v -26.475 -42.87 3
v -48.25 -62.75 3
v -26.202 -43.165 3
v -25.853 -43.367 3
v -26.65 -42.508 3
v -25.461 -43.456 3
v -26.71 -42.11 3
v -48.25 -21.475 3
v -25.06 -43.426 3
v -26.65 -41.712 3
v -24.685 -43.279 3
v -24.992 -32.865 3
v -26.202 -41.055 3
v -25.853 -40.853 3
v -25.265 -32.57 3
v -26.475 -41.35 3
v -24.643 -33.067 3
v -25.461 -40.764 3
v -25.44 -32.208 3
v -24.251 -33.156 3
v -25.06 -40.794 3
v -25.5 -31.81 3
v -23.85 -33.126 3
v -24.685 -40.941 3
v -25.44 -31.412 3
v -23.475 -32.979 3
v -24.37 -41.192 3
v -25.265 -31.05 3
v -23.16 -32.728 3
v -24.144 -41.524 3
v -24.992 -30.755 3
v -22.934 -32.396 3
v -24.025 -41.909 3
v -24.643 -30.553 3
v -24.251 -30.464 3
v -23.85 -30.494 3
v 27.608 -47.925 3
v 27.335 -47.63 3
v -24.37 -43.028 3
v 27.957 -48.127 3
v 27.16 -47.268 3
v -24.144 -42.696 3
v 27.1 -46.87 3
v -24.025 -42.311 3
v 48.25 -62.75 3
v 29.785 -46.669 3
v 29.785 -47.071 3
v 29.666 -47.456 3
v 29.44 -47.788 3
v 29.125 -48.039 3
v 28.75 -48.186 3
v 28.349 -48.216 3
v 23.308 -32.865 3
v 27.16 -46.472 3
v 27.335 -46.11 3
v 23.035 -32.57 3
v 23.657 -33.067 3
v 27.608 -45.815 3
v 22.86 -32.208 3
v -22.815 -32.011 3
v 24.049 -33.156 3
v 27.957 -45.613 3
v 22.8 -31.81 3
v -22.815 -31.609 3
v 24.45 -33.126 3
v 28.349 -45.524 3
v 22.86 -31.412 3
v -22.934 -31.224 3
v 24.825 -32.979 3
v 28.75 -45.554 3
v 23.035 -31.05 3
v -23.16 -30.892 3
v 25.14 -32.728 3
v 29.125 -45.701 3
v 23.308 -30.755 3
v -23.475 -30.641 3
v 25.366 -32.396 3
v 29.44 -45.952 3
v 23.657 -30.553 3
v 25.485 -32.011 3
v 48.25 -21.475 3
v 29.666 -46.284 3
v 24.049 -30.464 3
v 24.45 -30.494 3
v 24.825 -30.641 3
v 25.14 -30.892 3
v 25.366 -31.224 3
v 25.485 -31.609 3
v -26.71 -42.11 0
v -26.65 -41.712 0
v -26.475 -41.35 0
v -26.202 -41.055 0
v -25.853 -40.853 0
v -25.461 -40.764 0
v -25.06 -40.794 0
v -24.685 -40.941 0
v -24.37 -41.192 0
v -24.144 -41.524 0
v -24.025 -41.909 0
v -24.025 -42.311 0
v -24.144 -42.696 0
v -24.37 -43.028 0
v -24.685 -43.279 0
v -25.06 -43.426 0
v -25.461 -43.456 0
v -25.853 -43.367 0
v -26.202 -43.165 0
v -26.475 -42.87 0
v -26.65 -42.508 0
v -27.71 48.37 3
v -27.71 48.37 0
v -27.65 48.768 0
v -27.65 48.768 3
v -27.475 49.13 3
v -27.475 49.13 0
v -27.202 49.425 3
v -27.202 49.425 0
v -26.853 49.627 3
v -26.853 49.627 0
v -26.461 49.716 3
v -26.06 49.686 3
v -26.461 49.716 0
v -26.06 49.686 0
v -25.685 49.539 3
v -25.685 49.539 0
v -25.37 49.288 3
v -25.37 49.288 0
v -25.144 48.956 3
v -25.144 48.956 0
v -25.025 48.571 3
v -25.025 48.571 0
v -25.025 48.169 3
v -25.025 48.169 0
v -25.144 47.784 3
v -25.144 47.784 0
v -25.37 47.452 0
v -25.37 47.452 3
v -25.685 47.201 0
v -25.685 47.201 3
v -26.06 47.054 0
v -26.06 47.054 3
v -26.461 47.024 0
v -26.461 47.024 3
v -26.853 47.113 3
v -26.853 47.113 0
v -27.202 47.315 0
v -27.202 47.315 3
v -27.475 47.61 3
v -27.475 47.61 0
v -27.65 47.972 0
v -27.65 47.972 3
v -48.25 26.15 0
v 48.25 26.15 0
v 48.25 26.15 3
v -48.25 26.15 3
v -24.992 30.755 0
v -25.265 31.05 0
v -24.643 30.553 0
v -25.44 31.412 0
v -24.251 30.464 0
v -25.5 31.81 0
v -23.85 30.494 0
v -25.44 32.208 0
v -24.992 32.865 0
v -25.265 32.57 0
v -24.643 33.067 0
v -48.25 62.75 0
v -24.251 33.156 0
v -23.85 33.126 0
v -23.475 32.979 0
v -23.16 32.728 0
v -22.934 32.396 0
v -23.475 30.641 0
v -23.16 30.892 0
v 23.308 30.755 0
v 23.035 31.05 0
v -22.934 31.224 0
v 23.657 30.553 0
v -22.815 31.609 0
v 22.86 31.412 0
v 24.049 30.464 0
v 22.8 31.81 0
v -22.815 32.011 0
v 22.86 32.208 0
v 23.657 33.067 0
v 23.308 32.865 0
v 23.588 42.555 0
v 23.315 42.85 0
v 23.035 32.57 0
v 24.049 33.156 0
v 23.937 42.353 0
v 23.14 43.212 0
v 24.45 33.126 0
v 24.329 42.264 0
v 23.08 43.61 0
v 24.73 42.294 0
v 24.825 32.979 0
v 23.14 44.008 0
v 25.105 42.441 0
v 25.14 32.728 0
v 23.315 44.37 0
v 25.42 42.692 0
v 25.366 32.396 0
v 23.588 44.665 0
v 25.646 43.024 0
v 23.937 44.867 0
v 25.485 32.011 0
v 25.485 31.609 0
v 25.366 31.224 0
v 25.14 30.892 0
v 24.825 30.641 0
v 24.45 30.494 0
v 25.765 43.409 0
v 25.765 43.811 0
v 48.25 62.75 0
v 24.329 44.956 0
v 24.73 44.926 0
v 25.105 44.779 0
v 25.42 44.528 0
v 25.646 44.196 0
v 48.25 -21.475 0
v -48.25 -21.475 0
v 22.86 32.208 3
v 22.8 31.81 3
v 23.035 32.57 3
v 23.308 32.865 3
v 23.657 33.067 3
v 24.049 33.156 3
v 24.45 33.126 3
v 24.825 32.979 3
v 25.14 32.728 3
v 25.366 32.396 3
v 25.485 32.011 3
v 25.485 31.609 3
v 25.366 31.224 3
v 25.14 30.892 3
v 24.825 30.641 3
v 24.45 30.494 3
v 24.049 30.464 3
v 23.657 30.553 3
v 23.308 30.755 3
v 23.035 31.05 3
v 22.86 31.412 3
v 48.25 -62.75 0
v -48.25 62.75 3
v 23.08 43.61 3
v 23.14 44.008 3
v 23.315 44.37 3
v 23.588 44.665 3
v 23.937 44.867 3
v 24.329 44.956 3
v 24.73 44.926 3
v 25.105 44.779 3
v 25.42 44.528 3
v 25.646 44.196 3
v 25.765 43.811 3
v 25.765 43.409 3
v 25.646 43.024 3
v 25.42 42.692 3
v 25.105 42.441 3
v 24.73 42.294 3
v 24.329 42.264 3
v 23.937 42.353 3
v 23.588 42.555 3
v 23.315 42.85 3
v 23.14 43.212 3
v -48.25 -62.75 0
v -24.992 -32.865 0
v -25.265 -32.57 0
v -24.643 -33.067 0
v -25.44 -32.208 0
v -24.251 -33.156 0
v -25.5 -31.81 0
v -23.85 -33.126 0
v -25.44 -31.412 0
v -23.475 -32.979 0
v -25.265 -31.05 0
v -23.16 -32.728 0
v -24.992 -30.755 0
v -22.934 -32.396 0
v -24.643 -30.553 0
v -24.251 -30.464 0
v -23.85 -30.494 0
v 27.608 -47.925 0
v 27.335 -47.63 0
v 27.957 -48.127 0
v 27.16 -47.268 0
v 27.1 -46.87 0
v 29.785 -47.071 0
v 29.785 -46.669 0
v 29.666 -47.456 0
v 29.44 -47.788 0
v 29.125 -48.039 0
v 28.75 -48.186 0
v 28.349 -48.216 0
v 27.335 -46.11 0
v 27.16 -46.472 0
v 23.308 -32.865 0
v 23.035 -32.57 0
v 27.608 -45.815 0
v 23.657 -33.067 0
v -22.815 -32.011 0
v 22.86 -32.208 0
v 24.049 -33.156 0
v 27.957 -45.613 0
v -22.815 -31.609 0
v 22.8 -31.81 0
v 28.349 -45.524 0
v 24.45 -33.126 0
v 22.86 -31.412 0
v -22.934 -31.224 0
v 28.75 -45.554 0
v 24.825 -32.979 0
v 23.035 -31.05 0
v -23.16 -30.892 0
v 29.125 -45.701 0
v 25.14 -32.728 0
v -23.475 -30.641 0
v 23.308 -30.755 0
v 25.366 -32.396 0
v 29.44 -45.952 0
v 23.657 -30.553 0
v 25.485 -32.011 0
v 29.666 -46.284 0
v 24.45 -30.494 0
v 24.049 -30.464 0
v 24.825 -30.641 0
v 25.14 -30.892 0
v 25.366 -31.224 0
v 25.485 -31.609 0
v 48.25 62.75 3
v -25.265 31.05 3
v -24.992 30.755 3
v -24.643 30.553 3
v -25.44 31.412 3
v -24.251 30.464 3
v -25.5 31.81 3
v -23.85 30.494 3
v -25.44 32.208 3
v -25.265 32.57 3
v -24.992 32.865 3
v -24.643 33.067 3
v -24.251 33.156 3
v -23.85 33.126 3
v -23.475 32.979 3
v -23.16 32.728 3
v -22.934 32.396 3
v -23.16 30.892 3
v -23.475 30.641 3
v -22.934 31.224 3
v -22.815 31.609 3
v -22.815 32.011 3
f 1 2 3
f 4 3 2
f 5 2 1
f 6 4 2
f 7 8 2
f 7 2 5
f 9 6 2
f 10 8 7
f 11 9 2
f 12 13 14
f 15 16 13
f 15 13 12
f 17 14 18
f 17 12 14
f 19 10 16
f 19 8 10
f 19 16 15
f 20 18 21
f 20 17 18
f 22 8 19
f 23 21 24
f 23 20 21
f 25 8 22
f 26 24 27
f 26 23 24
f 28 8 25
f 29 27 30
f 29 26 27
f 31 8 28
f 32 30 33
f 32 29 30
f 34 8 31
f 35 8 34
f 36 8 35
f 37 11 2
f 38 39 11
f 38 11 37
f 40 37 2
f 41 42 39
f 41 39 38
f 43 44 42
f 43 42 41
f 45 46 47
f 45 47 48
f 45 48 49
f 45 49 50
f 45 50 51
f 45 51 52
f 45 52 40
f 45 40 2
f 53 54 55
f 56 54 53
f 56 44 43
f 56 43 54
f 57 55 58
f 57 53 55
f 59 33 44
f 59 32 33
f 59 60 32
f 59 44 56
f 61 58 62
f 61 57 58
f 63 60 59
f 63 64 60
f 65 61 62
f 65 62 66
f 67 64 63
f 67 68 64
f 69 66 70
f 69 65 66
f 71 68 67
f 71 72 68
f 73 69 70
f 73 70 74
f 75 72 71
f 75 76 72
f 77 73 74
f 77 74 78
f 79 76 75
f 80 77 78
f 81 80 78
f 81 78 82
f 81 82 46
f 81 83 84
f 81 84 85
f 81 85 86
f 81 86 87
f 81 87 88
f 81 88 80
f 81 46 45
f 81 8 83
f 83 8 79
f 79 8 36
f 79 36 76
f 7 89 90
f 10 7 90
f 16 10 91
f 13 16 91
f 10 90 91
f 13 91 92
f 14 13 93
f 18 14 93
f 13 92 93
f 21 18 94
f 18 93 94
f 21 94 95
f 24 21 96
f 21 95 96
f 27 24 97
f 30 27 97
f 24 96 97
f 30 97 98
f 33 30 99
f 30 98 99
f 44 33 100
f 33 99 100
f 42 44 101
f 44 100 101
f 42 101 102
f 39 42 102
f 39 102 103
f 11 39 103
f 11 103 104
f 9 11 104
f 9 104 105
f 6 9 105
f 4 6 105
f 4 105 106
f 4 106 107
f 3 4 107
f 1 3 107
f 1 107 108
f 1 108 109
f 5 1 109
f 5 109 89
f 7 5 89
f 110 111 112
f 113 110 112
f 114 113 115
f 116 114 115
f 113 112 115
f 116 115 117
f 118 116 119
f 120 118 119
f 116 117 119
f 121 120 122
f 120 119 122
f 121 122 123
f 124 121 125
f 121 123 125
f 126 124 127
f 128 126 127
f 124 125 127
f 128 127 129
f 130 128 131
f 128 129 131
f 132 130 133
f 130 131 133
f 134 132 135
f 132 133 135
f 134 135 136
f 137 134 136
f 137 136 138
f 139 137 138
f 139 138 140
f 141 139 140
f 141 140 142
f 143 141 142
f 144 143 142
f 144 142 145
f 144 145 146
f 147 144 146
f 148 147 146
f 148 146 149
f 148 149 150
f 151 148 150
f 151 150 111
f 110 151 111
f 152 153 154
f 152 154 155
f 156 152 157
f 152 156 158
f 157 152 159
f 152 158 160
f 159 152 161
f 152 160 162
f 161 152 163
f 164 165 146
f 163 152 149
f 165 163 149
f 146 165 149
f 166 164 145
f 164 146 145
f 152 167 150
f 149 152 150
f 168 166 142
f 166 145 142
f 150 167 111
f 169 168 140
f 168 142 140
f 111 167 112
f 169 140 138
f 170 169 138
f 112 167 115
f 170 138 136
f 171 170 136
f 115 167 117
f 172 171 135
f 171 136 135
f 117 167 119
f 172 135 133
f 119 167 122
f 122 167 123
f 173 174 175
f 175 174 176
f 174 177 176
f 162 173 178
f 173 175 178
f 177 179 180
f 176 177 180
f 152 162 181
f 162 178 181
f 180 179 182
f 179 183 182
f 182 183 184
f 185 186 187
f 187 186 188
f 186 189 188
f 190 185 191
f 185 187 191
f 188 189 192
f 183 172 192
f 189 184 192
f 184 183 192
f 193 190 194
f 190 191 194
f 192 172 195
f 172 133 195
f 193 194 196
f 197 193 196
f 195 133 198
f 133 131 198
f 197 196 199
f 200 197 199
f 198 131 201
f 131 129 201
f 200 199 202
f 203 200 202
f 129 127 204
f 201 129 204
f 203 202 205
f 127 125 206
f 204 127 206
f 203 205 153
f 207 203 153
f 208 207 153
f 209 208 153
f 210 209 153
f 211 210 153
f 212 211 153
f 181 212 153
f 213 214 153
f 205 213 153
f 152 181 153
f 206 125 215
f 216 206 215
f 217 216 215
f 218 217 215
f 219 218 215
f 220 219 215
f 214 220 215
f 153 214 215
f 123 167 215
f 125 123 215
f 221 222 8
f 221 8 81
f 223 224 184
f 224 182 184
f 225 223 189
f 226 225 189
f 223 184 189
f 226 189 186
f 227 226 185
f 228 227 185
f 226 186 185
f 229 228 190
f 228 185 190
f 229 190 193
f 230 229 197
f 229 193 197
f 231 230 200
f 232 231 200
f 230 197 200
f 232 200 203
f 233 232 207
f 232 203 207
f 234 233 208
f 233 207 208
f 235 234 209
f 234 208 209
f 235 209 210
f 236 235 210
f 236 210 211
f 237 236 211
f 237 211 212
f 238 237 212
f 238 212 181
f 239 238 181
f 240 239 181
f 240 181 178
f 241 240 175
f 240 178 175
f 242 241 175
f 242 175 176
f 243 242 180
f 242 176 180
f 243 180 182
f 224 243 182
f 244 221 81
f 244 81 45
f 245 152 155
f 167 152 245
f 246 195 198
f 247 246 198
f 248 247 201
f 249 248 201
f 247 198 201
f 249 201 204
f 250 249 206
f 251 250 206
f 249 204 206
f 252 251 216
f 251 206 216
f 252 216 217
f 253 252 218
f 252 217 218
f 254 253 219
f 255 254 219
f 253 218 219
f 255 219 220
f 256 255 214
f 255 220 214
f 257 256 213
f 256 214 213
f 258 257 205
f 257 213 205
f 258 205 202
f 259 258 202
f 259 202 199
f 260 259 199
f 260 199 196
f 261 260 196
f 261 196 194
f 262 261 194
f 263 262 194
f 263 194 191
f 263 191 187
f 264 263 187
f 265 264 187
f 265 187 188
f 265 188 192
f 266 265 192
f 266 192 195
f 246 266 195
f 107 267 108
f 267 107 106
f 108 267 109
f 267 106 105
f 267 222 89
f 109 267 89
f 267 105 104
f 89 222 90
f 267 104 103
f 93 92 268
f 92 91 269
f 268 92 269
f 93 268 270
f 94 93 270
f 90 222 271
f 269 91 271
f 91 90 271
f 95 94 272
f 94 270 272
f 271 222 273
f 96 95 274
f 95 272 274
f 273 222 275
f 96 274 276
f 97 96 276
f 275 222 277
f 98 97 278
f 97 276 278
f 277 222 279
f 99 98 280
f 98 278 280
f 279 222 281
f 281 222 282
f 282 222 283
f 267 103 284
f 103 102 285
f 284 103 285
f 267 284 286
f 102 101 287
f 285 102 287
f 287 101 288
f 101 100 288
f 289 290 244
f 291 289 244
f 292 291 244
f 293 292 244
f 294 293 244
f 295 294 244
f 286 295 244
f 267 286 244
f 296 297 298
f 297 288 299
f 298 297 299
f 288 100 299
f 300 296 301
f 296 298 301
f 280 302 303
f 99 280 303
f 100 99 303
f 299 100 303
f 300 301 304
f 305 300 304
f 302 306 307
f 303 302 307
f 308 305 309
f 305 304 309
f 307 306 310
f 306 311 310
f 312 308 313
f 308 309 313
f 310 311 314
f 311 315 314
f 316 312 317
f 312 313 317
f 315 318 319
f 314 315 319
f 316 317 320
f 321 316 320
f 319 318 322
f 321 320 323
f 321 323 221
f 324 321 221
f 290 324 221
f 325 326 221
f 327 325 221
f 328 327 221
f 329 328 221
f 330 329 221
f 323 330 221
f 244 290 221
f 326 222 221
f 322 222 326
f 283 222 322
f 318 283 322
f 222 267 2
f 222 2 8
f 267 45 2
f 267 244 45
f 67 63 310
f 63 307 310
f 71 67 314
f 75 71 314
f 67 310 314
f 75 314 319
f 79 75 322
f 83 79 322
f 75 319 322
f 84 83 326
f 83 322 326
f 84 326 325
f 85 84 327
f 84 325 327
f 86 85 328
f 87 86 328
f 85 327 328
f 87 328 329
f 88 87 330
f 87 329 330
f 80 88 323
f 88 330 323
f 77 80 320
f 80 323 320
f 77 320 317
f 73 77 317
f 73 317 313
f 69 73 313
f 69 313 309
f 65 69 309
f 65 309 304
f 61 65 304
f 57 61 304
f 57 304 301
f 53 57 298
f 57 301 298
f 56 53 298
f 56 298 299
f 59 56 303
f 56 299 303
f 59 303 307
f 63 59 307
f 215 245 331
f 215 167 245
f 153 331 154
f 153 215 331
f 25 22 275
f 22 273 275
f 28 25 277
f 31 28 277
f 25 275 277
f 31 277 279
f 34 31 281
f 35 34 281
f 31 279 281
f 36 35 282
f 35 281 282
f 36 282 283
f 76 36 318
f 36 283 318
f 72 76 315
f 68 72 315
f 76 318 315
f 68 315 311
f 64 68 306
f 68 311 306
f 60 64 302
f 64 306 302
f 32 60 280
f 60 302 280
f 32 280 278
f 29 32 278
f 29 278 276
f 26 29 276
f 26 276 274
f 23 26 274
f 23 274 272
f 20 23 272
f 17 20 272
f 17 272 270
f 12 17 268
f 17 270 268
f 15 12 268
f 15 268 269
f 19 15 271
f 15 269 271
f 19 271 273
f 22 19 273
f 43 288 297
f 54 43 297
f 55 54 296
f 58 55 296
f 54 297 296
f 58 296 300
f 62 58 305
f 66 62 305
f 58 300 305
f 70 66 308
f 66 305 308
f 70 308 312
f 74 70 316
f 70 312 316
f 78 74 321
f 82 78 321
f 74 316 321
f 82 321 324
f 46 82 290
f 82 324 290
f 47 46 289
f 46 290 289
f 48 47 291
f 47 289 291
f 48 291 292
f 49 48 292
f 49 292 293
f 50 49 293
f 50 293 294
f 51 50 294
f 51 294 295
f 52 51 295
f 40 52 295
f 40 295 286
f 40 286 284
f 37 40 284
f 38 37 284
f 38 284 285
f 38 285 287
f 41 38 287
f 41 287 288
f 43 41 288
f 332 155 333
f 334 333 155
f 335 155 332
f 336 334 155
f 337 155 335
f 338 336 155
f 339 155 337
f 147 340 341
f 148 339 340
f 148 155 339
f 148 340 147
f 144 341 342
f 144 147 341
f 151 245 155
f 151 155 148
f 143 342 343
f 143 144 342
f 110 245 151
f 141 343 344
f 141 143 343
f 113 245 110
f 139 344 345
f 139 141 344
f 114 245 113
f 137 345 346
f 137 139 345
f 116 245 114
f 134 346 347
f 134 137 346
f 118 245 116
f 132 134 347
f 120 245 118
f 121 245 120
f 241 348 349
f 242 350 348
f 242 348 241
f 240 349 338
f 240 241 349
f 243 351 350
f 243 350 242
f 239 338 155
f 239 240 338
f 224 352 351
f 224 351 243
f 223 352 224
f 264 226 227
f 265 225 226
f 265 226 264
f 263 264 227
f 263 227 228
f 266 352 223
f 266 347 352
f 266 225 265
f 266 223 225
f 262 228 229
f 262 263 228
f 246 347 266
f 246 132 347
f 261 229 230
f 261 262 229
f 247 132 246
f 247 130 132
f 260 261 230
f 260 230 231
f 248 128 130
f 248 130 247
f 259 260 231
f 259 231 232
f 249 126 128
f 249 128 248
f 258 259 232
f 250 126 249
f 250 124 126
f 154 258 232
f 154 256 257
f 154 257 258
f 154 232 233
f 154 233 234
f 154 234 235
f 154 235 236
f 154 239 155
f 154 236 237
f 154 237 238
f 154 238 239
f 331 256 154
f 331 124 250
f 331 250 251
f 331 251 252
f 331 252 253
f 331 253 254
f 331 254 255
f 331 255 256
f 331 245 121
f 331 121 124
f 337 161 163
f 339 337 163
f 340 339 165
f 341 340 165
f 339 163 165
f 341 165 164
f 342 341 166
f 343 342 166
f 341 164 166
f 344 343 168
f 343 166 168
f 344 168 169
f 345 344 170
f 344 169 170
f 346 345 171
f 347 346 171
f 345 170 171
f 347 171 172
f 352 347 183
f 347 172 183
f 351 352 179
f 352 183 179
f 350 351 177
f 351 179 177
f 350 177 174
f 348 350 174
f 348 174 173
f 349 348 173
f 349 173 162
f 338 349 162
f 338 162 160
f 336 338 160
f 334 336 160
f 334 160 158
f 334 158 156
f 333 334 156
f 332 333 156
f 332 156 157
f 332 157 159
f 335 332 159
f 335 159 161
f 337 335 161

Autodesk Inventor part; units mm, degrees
ref_plane "YZ Plane" through (0, 0, 0) normal (1, 0, 0) x (0, 1, 0)
ref_plane "XZ Plane" through (0, 0, 0) normal (0, 1, 0) x (-1, 0, 0)
ref_plane "XY Plane" through (0, 0, 0) normal (0, 0, 1) x (1, 0, 0)
sketch "Sketch1" plane through (0, 0, 0) normal (0, 0, 1) x (1, 0, 0)
  line L0 (-48.25, 62.75) -> (48.25, 62.75)
  line L1 (48.25, 62.75) -> (48.25, -62.75)
  line L2 (48.25, -62.75) -> (-48.25, -62.75)
  line L3 (-48.25, -62.75) -> (-48.25, 62.75)
  line L4 (-48.25, 62.75) -> (48.25, -62.75) construction
  line L5 (48.25, 62.75) -> (-48.25, -62.75) construction
  point P0 (0, 0)
  dimension "d0" = 96.5
  dimension "d1" = 125.5
extrude "Extrusion1" add sketch "Sketch1" along normal blind 3
ref_plane "Work Plane2" through (-48.25, 0, 0) normal (0, -1, 0) x (1, 0, 0)
sketch "Sketch3" plane through (0, 0, 0) normal (0, 0, -1) x (-1, 0, 0)
  point P0 (0, 0)
  point P1 (0, 0)
sketch "Sketch4" plane through (0, 0, 0) normal (0, 0, -1) x (-1, 0, 0)
  point P0 (0, 0)
sketch "Sketch5" plane through (0, 0, 0) normal (0, 0, -1) x (-1, 0, 0)
  circle A0 centre (-24.15, 31.81) radius 1.35
  line L0 (-48.25, 62.75) -> (48.25, 62.75) projected
  line L1 (-48.25, -62.75) -> (-48.25, 62.75) projected
  line L2 (-48.25, 62.75) -> (48.25, 62.75) projected
  line L3 (0, 62.75) -> (0, -62.75)
  line L4 (48.25, -62.75) -> (-48.25, -62.75) projected
  circle A1 centre (24.15, 31.81) radius 1.35
  line L5 (-48.25, 0) -> (48.25, 0)
  line L6 (48.25, 62.75) -> (48.25, -62.75) projected
  circle A2 centre (-24.15, -31.81) radius 1.35
  circle A3 centre (24.15, -31.81) radius 1.35
  circle A4 centre (-24.43, 43.61) radius 1.35
  circle A5 centre (26.36, 48.37) radius 1.35
  circle A6 centre (-28.45, -46.87) radius 1.35
  circle A7 centre (25.36, -42.11) radius 1.35
  point P0 (0, 0)
  dimension "d4" = 2.7
  dimension "d6" = 30.94
  dimension "d7" = 24.1
  dimension "d8" = 2.7
  dimension "d9" = 2.7
  dimension "d10" = 2.7
  dimension "d11" = 2.7
  dimension "d12" = 23.82
  dimension "d13" = 19.14
  dimension "d14" = 14.38
  dimension "d15" = 21.89
  dimension "d16" = 19.8
  dimension "d18" = 15.88
  dimension "d19" = 20.64
  dimension "d20" = 22.89
extrude "Extrusion2" cut sketch "Sketch5" against normal through all contours A0 | A1 | A2 | A3 | A4 | A5 | A6 | A7
sketch "Sketch6" plane through (0, 0, 0) normal (0, 0, -1) x (-1, 0, 0)
  line L0 (-48.25, -62.75) -> (-48.25, 62.75) projected
  line L1 (48.25, 62.75) -> (48.25, -62.75) projected
  line L2 (-48.25, 26.15) -> (48.25, 26.15)
  line L3 (48.25, 26.15) -> (48.25, -21.475)
  line L4 (48.25, -21.475) -> (-48.25, -21.475)
  line L5 (-48.25, -21.475) -> (-48.25, 26.15)
  line L6 (-48.25, 62.75) -> (48.25, 62.75) projected
  line L7 (48.25, -62.75) -> (-48.25, -62.75) projected
  point P0 (0, 0)
  point P1 (-48.25, -21.475)
  point P2 (48.25, 26.15)
  dimension "d23" = 36.6
  dimension "d24" = 41.275
extrude "Extrusion3" cut sketch "Sketch6" against normal blind 10 contours L0 L2 L1 L4
properties part number "n"
